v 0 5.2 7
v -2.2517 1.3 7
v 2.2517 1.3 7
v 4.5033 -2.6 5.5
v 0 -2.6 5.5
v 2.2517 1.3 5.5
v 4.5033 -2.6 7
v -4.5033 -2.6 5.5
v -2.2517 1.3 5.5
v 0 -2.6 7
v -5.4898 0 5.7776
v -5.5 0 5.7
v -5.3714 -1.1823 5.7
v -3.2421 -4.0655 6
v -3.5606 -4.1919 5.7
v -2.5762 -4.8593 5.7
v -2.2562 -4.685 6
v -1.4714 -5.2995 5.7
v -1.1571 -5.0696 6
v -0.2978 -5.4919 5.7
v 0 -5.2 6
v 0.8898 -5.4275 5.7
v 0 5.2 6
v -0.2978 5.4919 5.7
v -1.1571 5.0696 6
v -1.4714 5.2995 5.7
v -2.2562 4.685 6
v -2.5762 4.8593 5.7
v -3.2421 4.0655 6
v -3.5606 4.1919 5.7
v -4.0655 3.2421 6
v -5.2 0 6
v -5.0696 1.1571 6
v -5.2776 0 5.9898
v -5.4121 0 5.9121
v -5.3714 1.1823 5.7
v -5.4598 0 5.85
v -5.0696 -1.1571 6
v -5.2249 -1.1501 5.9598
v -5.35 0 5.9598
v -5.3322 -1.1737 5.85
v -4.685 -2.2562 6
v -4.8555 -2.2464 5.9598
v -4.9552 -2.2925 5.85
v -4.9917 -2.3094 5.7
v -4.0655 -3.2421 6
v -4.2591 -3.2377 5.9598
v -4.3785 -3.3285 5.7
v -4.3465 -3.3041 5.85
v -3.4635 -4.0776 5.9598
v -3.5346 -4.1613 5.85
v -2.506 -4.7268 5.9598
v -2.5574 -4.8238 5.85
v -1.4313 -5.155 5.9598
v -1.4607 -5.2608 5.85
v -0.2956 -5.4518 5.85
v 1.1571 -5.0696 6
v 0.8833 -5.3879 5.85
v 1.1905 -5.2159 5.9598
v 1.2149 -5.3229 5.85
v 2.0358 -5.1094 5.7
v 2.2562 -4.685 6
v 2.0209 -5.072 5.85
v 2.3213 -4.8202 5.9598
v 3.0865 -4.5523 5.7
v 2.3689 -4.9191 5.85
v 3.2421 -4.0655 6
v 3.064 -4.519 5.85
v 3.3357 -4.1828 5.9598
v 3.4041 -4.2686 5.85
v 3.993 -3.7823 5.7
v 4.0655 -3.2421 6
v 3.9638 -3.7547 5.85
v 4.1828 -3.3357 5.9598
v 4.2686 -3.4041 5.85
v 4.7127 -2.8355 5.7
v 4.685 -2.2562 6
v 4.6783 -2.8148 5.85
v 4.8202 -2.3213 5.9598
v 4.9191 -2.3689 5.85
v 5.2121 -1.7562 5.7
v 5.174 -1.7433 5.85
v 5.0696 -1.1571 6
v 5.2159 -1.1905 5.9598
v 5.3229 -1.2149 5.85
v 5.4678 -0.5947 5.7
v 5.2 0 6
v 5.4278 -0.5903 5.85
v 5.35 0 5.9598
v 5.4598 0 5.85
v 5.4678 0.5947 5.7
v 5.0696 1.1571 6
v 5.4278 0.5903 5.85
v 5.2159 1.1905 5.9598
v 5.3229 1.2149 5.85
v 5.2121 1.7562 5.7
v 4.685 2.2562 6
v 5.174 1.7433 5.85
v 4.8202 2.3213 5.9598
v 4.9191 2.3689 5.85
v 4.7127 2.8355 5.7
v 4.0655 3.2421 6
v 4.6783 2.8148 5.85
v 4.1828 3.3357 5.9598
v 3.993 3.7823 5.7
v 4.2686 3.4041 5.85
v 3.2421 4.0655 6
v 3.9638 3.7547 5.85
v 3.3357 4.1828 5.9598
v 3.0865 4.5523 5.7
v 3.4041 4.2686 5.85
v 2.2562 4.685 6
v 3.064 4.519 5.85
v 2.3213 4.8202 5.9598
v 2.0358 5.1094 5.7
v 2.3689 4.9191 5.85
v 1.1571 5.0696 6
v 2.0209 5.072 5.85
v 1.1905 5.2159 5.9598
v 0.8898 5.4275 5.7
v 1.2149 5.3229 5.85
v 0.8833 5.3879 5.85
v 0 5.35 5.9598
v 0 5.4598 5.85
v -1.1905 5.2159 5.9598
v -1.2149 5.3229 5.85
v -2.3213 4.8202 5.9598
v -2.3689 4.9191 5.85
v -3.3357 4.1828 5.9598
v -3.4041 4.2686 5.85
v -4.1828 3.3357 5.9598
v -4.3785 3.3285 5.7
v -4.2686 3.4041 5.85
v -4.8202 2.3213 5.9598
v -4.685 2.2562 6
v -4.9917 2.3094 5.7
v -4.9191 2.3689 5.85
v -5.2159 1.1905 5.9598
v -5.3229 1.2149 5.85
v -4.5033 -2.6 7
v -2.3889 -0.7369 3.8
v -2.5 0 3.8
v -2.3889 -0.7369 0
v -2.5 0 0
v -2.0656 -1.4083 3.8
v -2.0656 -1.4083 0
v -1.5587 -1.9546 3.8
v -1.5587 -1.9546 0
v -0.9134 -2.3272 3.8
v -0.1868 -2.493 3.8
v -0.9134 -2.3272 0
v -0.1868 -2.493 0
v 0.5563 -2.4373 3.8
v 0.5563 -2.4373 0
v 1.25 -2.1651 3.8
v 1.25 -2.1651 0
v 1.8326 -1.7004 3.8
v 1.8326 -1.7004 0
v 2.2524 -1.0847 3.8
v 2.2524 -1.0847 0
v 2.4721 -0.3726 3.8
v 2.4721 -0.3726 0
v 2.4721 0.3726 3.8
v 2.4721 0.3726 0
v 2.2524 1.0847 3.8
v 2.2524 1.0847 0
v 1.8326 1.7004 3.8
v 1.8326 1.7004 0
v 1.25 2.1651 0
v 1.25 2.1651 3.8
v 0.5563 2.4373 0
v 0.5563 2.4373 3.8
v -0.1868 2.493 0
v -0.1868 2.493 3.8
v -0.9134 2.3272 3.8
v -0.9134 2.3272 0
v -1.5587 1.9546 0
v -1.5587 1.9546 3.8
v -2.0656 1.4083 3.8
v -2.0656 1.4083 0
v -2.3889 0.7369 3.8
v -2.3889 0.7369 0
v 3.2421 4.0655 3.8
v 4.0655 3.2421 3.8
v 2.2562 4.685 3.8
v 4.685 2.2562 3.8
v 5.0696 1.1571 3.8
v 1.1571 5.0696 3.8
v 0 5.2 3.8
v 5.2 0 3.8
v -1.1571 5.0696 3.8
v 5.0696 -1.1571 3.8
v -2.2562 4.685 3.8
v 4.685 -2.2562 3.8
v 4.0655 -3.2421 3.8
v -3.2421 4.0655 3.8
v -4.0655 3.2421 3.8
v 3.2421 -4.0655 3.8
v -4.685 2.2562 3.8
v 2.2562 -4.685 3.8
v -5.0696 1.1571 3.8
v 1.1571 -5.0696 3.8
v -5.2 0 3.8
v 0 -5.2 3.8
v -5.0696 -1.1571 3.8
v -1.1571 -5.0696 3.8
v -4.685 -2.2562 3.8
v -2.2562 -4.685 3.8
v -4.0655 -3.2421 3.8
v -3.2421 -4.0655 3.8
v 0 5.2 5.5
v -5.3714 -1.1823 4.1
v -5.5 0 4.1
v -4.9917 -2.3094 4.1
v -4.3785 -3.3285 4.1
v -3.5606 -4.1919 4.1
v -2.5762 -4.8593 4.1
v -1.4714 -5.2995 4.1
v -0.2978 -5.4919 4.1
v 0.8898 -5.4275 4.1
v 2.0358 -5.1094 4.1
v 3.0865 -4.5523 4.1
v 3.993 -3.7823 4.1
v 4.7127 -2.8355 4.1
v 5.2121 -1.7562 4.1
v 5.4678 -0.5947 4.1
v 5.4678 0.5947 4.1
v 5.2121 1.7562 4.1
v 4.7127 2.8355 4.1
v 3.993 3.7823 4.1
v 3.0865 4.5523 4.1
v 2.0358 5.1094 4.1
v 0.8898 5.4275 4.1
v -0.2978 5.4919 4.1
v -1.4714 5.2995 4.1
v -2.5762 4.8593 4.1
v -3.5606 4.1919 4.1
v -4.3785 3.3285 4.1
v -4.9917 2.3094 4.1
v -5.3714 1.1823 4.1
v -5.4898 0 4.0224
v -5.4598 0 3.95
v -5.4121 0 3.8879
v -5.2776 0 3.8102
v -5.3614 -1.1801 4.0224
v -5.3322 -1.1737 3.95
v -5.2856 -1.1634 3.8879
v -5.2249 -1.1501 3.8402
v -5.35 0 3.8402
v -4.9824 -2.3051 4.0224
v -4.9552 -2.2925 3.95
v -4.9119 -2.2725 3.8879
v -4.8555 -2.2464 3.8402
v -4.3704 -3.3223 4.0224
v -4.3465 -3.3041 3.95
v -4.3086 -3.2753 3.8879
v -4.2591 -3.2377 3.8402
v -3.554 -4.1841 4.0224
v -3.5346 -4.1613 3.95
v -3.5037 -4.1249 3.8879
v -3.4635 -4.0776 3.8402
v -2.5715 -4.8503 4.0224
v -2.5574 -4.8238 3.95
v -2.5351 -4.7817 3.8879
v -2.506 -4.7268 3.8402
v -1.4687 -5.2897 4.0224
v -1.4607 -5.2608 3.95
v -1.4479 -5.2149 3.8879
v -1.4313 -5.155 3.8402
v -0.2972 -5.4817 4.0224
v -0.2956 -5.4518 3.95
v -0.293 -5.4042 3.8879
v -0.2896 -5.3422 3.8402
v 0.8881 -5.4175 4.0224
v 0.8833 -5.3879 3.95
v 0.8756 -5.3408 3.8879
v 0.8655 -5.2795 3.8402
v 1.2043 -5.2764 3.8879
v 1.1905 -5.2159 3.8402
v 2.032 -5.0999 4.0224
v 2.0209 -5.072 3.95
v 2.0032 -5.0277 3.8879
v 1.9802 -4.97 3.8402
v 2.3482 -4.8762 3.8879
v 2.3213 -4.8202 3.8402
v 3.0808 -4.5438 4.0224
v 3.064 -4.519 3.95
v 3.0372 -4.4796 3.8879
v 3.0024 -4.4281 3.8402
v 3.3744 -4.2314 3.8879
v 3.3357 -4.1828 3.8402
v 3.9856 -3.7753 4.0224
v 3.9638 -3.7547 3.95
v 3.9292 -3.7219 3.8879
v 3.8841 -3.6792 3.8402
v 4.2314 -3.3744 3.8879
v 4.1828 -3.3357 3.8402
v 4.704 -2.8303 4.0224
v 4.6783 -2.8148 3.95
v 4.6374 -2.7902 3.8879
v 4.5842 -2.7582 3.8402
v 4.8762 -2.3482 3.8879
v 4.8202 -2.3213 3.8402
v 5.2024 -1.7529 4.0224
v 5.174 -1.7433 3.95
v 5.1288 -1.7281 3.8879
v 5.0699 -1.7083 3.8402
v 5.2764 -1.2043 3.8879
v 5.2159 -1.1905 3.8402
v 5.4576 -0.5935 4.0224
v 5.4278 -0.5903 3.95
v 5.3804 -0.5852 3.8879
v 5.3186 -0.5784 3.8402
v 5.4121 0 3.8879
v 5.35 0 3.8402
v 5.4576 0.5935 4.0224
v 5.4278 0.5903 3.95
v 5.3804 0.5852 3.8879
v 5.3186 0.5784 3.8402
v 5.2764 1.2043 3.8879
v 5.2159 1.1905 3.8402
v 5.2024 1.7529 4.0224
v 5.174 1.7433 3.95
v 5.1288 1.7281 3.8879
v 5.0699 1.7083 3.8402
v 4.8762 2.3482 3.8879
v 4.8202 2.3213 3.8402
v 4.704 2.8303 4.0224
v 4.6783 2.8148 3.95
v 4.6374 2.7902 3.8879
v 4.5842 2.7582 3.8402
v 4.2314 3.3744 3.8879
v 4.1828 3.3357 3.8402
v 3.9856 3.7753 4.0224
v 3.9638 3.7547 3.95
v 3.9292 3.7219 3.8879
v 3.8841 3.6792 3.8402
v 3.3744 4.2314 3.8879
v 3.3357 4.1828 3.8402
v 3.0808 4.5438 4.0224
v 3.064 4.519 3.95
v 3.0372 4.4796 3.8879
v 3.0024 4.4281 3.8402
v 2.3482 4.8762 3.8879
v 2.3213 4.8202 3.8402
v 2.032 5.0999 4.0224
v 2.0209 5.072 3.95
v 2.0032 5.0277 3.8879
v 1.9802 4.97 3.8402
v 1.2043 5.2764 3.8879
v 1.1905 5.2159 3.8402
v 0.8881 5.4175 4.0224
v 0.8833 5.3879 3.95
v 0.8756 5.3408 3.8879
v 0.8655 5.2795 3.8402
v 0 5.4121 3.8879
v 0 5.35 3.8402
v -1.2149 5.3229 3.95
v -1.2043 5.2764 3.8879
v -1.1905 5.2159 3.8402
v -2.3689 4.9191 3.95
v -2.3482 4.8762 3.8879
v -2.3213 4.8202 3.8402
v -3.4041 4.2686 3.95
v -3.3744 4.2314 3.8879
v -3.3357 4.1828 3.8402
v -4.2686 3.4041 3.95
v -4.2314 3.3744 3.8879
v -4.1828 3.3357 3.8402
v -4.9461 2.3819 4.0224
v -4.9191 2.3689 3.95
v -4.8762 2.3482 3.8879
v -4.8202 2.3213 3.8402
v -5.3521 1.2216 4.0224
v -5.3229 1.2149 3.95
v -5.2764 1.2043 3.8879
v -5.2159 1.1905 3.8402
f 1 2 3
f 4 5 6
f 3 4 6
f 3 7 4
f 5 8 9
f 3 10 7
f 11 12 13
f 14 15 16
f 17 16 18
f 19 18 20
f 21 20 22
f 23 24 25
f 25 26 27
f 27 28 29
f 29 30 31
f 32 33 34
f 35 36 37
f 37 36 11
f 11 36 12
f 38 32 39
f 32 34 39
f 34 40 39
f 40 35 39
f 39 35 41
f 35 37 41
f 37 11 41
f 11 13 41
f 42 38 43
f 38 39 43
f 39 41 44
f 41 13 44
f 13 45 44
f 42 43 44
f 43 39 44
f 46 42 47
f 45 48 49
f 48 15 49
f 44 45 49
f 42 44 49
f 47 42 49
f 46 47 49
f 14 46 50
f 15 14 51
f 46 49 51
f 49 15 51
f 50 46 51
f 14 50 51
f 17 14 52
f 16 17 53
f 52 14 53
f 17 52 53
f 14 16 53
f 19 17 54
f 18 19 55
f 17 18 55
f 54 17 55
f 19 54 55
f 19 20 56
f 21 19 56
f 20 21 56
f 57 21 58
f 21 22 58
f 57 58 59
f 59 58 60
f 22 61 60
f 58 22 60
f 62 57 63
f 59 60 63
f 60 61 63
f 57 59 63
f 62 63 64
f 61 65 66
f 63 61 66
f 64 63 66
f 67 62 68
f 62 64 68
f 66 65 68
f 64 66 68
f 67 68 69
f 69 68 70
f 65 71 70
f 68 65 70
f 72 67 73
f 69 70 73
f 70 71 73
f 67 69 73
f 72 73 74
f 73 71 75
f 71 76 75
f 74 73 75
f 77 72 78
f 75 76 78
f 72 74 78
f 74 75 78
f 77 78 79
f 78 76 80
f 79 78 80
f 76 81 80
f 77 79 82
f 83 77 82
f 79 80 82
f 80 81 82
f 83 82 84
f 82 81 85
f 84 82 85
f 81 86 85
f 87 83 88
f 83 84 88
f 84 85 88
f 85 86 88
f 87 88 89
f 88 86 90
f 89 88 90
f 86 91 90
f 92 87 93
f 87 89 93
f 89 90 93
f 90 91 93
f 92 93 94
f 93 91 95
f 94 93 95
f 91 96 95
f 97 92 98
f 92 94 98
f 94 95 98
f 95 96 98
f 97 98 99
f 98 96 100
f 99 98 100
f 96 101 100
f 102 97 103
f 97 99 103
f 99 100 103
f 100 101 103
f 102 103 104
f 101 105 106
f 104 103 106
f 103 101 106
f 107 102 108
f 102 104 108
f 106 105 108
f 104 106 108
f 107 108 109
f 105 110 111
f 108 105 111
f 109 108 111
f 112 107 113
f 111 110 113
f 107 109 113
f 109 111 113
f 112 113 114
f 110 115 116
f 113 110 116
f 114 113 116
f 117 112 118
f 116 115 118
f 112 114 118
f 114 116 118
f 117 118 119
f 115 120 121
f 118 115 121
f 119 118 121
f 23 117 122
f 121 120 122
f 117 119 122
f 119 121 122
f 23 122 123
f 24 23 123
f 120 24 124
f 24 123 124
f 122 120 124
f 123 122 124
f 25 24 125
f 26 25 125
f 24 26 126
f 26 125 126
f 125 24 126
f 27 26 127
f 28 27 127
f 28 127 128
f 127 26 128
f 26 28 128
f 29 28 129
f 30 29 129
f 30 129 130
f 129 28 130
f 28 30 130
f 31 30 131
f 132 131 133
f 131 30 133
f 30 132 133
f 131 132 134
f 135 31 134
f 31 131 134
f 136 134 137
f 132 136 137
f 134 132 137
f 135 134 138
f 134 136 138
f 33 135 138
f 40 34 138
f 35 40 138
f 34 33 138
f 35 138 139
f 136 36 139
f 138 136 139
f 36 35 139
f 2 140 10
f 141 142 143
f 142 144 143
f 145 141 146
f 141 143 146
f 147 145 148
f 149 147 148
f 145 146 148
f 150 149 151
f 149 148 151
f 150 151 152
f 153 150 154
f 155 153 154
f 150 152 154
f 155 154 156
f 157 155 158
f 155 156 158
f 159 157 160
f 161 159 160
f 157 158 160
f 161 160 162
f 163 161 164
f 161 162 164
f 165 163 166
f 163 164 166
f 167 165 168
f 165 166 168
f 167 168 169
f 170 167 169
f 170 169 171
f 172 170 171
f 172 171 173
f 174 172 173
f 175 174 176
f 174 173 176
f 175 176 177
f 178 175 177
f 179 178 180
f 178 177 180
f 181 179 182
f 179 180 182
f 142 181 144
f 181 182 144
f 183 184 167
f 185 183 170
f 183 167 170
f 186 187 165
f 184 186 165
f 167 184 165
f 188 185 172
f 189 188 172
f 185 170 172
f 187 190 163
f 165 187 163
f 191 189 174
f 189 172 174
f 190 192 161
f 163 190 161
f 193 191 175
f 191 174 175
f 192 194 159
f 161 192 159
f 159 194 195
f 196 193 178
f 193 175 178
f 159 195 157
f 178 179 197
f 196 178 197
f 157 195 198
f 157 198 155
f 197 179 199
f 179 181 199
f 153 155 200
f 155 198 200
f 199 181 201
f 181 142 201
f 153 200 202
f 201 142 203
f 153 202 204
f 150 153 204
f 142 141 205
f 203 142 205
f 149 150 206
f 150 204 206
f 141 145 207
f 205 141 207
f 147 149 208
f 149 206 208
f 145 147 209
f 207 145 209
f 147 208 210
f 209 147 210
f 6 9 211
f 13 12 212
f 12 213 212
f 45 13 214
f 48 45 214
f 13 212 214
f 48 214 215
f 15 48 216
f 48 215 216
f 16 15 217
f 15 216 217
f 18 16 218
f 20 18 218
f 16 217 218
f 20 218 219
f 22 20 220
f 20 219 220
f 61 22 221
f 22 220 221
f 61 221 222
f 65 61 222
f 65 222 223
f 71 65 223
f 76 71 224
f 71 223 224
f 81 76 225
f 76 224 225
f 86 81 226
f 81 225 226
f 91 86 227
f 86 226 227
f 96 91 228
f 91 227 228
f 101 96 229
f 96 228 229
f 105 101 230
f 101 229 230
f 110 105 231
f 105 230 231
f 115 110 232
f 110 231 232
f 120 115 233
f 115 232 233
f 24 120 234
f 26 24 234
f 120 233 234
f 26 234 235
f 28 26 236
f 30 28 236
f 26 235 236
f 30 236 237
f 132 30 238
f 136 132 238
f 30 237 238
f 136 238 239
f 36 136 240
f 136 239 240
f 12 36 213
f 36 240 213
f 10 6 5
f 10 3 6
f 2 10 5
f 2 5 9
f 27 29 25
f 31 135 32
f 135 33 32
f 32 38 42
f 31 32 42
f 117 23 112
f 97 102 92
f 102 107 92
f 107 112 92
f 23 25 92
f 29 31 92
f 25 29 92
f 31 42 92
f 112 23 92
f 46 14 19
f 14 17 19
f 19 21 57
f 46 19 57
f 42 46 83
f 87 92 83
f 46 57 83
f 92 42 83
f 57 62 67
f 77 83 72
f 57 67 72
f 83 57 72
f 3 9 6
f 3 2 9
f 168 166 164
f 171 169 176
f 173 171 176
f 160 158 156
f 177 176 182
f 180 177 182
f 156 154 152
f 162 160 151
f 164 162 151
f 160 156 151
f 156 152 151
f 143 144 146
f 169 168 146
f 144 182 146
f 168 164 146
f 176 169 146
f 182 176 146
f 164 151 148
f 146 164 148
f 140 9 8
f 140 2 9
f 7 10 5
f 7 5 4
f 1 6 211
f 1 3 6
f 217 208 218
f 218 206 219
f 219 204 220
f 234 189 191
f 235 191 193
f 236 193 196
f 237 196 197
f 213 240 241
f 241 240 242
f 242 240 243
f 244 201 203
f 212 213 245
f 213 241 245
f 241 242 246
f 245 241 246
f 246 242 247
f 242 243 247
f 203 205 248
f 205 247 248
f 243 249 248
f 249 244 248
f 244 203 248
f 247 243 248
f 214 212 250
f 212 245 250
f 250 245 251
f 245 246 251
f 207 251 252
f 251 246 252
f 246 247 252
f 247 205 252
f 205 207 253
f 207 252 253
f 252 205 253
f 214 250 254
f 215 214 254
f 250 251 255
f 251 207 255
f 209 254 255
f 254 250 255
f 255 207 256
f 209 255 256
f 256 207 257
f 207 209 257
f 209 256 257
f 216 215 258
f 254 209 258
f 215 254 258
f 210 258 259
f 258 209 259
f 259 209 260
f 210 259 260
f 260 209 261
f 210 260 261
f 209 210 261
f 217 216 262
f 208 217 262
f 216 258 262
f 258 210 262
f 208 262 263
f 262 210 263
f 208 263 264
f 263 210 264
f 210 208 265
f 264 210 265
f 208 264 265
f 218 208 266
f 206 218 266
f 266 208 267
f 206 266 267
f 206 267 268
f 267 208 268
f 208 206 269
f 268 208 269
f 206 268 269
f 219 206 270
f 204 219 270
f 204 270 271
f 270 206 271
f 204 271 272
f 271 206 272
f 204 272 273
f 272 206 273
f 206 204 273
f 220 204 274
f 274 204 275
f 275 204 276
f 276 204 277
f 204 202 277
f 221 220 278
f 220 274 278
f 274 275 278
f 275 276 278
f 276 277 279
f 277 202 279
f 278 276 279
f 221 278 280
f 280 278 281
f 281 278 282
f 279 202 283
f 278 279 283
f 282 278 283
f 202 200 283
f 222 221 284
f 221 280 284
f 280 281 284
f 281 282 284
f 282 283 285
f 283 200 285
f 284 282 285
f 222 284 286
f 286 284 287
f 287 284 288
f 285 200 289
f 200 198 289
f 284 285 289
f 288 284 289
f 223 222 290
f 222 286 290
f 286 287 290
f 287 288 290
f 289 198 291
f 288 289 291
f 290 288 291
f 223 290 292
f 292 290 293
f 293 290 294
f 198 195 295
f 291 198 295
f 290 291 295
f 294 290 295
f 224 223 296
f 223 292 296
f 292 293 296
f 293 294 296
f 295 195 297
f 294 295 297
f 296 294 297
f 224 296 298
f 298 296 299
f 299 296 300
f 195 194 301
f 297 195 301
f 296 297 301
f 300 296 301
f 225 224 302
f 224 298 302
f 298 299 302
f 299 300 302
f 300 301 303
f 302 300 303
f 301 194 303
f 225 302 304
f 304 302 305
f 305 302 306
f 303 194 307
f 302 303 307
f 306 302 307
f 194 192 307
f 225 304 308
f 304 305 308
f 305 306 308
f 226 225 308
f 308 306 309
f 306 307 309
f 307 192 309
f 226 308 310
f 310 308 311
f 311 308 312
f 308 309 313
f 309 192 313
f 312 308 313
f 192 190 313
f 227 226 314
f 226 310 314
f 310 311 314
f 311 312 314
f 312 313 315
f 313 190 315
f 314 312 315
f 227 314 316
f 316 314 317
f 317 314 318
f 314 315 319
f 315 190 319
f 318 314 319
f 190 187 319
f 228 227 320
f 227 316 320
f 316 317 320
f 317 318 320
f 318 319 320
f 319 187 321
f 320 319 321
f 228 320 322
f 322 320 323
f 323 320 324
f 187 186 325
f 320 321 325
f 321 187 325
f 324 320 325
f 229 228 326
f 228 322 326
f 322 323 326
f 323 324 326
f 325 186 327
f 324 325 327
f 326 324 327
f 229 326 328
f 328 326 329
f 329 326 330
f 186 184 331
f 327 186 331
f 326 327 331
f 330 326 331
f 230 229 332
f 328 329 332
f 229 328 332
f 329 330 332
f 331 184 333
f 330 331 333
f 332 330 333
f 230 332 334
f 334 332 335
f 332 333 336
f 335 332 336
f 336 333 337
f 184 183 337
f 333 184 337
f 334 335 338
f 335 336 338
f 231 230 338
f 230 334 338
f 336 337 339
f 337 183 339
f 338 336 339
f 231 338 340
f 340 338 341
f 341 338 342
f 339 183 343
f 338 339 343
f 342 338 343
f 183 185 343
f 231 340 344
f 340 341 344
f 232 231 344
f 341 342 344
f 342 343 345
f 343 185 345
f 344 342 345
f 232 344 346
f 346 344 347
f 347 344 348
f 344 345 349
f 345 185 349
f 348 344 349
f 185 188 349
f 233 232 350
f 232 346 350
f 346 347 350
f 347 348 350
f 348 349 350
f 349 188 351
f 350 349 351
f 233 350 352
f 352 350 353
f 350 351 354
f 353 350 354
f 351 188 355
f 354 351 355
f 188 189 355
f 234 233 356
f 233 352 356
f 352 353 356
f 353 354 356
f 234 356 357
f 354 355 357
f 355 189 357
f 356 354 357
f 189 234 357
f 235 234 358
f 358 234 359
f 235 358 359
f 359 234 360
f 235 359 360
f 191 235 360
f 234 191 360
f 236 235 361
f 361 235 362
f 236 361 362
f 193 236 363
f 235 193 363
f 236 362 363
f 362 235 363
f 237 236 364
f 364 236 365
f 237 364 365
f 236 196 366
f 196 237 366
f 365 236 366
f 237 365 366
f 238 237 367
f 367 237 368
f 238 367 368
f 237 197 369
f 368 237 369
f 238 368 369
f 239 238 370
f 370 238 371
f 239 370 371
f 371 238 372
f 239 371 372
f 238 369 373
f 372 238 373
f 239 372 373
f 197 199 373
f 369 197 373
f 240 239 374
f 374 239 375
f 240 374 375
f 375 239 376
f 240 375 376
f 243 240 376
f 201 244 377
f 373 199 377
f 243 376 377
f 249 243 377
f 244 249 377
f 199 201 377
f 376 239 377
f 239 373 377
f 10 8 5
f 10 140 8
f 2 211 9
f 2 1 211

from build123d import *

# Parameters (mm, degrees)
F3_DEPTH      = 1
F3_DEPTH_BACK = 0.5


with BuildPart() as f1:
    # F0 (on Front) → F1 (revolve)
    with BuildSketch(Plane.XZ):
        Polygon((-2.5, 0), (0, 0), (0, 6), (-2.5, 6), (-2.5, 3.8), align=None)
        with BuildLine():
            Line((-5.2, 3.8), (-2.5, 3.8))
            Line((-2.5, 3.8), (-2.5, 6))
            Line((-2.5, 6), (-5.2, 6))
            ThreePointArc((-5.2, 6), (-5.412132, 5.912132), (-5.5, 5.7))
            Line((-5.5, 5.7), (-5.5, 4.1))
            ThreePointArc((-5.5, 4.1), (-5.412132, 3.887868), (-5.2, 3.8))
        make_face()
    revolve(axis=Axis((0, 0, 3), (0, 0, 1)))


with BuildPart() as f3:
    # F2 (on face) → F3 (new body, two sides)
    with BuildSketch(Plane.XY.offset(6)) as f3_sk:
        Polygon((-4.503332, -2.6), (0, -2.6), (-2.251666, 1.3), align=None)
        Polygon((2.251666, 1.3), (0, -2.6), (4.503332, -2.6), align=None)
        Polygon((0, 5.2), (-2.251666, 1.3), (2.251666, 1.3), align=None)
    extrude(amount=F3_DEPTH)
    extrude(f3_sk.sketch, amount=-F3_DEPTH_BACK)


solid = Compound([f1.part, f3.part])
